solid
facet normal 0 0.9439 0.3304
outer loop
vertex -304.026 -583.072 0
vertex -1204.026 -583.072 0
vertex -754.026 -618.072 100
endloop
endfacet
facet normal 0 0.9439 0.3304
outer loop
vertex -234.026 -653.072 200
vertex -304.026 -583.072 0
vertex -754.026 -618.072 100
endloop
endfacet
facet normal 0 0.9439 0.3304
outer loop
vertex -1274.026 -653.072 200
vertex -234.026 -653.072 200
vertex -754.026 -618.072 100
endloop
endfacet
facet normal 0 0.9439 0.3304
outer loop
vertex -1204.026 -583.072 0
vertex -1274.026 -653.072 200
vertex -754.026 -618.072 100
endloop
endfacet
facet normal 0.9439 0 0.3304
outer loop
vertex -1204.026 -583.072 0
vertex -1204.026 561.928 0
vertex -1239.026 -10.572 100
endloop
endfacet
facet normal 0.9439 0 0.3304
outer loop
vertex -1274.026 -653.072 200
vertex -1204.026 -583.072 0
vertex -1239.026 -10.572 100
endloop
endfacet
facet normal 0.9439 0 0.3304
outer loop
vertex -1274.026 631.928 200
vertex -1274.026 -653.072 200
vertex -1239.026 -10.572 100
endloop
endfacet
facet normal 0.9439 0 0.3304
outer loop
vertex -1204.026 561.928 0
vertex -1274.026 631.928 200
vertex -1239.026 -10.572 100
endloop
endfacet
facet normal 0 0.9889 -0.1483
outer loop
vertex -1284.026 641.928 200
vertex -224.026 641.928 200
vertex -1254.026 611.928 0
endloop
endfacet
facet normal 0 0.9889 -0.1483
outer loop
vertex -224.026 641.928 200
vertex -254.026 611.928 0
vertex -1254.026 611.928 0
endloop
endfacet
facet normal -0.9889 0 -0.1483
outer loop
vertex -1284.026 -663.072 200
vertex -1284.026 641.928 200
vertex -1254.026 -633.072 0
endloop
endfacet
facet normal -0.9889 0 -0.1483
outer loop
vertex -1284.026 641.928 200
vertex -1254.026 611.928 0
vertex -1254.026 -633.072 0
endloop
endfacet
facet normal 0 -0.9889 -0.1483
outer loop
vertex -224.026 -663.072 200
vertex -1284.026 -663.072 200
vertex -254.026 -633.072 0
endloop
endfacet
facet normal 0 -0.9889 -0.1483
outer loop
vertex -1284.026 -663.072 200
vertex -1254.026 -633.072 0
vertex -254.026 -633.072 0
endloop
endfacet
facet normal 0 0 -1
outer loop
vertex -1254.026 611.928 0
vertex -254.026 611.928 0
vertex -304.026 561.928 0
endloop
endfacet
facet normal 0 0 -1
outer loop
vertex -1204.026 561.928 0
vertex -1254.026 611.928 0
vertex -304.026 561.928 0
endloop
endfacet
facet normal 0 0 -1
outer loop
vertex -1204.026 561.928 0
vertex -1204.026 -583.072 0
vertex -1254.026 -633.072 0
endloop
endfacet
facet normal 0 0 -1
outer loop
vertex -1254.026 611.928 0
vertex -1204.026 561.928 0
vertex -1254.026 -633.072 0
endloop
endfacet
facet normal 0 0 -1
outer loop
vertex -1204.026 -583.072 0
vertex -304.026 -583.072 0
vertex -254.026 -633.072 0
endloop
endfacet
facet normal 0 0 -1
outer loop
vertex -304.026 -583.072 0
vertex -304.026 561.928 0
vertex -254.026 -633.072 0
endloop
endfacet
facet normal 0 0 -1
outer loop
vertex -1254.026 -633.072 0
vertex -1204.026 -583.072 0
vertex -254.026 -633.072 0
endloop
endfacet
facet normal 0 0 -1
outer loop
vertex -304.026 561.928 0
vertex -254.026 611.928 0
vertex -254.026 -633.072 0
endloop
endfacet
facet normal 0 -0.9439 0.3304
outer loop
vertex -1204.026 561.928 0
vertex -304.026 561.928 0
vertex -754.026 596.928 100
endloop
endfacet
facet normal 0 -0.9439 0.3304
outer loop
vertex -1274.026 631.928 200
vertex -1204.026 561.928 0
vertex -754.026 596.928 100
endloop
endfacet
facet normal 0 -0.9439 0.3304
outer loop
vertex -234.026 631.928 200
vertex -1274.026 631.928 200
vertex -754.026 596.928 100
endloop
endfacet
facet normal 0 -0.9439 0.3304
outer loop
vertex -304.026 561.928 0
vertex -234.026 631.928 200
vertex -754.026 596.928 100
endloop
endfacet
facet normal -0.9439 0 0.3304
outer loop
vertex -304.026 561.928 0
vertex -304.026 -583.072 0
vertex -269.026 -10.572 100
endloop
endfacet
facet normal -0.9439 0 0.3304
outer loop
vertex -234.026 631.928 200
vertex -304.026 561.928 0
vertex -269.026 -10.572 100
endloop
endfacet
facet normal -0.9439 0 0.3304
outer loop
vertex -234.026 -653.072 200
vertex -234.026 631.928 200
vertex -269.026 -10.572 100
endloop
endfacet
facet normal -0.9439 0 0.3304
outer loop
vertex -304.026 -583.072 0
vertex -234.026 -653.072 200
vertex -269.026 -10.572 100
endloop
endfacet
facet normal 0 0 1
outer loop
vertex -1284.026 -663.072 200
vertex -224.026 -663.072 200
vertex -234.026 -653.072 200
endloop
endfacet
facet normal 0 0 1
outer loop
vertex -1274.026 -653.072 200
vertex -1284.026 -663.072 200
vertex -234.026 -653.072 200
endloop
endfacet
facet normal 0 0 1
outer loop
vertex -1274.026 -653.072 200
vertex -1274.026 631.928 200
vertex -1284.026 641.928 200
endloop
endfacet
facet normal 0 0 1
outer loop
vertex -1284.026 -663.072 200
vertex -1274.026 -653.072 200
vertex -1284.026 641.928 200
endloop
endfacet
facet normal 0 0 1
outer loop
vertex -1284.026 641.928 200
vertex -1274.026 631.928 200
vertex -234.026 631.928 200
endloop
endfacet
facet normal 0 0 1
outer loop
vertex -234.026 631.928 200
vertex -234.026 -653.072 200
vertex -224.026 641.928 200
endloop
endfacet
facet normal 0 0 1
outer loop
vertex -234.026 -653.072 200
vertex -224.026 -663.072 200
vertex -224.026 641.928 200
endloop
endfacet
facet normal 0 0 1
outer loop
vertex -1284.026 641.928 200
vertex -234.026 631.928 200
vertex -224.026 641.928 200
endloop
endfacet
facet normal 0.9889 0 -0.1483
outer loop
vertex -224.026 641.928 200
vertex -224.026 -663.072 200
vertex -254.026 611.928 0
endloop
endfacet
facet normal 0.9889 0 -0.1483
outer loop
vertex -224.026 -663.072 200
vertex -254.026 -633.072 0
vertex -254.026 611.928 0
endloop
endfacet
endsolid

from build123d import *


with BuildPart() as part:
    # Sketch9 → Loft1 section 0
    with BuildSketch(Plane.XY.offset(200)):
        with BuildLine():
            Line((-224.025723473, -663.072347267), (-224.025723473, 641.927652733))
            Line((-224.025723473, 641.927652733), (-1284.025723473, 641.927652733))
            Line((-1284.025723473, 641.927652733), (-1284.025723473, -663.072347267))
            Line((-1284.025723473, -663.072347267), (-224.025723473, -663.072347267))
        make_face()
    # Sketch1 → Loft1 section 1
    with BuildSketch(Plane.XY):
        with BuildLine():
            Line((-1254.025723473, 611.927652733), (-254.025723473, 611.927652733))
            Line((-254.025723473, 611.927652733), (-254.025723473, -633.072347267))
            Line((-254.025723473, -633.072347267), (-1254.025723473, -633.072347267))
            Line((-1254.025723473, -633.072347267), (-1254.025723473, 611.927652733))
        make_face()
    loft()

    # Sketch13 → Cut-Loft5 section 0
    with BuildSketch(Plane.XY):
        with BuildLine():
            Line((-1204.025723473, -583.072347267), (-304.025723473, -583.072347267))
            Line((-304.025723473, -583.072347267), (-304.025723473, 561.927652733))
            Line((-304.025723473, 561.927652733), (-1204.025723473, 561.927652733))
            Line((-1204.025723473, 561.927652733), (-1204.025723473, -583.072347267))
        make_face()
    # Sketch12 → Cut-Loft5 section 1
    with BuildSketch(Plane.XY.offset(200)):
        with BuildLine():
            Line((-1274.025723473, 631.927652733), (-1274.025723473, -653.072347267))
            Line((-1274.025723473, -653.072347267), (-234.025723473, -653.072347267))
            Line((-234.025723473, -653.072347267), (-234.025723473, 631.927652733))
            Line((-234.025723473, 631.927652733), (-1274.025723473, 631.927652733))
        make_face()
    loft(mode=Mode.SUBTRACT)


solid = part.part
